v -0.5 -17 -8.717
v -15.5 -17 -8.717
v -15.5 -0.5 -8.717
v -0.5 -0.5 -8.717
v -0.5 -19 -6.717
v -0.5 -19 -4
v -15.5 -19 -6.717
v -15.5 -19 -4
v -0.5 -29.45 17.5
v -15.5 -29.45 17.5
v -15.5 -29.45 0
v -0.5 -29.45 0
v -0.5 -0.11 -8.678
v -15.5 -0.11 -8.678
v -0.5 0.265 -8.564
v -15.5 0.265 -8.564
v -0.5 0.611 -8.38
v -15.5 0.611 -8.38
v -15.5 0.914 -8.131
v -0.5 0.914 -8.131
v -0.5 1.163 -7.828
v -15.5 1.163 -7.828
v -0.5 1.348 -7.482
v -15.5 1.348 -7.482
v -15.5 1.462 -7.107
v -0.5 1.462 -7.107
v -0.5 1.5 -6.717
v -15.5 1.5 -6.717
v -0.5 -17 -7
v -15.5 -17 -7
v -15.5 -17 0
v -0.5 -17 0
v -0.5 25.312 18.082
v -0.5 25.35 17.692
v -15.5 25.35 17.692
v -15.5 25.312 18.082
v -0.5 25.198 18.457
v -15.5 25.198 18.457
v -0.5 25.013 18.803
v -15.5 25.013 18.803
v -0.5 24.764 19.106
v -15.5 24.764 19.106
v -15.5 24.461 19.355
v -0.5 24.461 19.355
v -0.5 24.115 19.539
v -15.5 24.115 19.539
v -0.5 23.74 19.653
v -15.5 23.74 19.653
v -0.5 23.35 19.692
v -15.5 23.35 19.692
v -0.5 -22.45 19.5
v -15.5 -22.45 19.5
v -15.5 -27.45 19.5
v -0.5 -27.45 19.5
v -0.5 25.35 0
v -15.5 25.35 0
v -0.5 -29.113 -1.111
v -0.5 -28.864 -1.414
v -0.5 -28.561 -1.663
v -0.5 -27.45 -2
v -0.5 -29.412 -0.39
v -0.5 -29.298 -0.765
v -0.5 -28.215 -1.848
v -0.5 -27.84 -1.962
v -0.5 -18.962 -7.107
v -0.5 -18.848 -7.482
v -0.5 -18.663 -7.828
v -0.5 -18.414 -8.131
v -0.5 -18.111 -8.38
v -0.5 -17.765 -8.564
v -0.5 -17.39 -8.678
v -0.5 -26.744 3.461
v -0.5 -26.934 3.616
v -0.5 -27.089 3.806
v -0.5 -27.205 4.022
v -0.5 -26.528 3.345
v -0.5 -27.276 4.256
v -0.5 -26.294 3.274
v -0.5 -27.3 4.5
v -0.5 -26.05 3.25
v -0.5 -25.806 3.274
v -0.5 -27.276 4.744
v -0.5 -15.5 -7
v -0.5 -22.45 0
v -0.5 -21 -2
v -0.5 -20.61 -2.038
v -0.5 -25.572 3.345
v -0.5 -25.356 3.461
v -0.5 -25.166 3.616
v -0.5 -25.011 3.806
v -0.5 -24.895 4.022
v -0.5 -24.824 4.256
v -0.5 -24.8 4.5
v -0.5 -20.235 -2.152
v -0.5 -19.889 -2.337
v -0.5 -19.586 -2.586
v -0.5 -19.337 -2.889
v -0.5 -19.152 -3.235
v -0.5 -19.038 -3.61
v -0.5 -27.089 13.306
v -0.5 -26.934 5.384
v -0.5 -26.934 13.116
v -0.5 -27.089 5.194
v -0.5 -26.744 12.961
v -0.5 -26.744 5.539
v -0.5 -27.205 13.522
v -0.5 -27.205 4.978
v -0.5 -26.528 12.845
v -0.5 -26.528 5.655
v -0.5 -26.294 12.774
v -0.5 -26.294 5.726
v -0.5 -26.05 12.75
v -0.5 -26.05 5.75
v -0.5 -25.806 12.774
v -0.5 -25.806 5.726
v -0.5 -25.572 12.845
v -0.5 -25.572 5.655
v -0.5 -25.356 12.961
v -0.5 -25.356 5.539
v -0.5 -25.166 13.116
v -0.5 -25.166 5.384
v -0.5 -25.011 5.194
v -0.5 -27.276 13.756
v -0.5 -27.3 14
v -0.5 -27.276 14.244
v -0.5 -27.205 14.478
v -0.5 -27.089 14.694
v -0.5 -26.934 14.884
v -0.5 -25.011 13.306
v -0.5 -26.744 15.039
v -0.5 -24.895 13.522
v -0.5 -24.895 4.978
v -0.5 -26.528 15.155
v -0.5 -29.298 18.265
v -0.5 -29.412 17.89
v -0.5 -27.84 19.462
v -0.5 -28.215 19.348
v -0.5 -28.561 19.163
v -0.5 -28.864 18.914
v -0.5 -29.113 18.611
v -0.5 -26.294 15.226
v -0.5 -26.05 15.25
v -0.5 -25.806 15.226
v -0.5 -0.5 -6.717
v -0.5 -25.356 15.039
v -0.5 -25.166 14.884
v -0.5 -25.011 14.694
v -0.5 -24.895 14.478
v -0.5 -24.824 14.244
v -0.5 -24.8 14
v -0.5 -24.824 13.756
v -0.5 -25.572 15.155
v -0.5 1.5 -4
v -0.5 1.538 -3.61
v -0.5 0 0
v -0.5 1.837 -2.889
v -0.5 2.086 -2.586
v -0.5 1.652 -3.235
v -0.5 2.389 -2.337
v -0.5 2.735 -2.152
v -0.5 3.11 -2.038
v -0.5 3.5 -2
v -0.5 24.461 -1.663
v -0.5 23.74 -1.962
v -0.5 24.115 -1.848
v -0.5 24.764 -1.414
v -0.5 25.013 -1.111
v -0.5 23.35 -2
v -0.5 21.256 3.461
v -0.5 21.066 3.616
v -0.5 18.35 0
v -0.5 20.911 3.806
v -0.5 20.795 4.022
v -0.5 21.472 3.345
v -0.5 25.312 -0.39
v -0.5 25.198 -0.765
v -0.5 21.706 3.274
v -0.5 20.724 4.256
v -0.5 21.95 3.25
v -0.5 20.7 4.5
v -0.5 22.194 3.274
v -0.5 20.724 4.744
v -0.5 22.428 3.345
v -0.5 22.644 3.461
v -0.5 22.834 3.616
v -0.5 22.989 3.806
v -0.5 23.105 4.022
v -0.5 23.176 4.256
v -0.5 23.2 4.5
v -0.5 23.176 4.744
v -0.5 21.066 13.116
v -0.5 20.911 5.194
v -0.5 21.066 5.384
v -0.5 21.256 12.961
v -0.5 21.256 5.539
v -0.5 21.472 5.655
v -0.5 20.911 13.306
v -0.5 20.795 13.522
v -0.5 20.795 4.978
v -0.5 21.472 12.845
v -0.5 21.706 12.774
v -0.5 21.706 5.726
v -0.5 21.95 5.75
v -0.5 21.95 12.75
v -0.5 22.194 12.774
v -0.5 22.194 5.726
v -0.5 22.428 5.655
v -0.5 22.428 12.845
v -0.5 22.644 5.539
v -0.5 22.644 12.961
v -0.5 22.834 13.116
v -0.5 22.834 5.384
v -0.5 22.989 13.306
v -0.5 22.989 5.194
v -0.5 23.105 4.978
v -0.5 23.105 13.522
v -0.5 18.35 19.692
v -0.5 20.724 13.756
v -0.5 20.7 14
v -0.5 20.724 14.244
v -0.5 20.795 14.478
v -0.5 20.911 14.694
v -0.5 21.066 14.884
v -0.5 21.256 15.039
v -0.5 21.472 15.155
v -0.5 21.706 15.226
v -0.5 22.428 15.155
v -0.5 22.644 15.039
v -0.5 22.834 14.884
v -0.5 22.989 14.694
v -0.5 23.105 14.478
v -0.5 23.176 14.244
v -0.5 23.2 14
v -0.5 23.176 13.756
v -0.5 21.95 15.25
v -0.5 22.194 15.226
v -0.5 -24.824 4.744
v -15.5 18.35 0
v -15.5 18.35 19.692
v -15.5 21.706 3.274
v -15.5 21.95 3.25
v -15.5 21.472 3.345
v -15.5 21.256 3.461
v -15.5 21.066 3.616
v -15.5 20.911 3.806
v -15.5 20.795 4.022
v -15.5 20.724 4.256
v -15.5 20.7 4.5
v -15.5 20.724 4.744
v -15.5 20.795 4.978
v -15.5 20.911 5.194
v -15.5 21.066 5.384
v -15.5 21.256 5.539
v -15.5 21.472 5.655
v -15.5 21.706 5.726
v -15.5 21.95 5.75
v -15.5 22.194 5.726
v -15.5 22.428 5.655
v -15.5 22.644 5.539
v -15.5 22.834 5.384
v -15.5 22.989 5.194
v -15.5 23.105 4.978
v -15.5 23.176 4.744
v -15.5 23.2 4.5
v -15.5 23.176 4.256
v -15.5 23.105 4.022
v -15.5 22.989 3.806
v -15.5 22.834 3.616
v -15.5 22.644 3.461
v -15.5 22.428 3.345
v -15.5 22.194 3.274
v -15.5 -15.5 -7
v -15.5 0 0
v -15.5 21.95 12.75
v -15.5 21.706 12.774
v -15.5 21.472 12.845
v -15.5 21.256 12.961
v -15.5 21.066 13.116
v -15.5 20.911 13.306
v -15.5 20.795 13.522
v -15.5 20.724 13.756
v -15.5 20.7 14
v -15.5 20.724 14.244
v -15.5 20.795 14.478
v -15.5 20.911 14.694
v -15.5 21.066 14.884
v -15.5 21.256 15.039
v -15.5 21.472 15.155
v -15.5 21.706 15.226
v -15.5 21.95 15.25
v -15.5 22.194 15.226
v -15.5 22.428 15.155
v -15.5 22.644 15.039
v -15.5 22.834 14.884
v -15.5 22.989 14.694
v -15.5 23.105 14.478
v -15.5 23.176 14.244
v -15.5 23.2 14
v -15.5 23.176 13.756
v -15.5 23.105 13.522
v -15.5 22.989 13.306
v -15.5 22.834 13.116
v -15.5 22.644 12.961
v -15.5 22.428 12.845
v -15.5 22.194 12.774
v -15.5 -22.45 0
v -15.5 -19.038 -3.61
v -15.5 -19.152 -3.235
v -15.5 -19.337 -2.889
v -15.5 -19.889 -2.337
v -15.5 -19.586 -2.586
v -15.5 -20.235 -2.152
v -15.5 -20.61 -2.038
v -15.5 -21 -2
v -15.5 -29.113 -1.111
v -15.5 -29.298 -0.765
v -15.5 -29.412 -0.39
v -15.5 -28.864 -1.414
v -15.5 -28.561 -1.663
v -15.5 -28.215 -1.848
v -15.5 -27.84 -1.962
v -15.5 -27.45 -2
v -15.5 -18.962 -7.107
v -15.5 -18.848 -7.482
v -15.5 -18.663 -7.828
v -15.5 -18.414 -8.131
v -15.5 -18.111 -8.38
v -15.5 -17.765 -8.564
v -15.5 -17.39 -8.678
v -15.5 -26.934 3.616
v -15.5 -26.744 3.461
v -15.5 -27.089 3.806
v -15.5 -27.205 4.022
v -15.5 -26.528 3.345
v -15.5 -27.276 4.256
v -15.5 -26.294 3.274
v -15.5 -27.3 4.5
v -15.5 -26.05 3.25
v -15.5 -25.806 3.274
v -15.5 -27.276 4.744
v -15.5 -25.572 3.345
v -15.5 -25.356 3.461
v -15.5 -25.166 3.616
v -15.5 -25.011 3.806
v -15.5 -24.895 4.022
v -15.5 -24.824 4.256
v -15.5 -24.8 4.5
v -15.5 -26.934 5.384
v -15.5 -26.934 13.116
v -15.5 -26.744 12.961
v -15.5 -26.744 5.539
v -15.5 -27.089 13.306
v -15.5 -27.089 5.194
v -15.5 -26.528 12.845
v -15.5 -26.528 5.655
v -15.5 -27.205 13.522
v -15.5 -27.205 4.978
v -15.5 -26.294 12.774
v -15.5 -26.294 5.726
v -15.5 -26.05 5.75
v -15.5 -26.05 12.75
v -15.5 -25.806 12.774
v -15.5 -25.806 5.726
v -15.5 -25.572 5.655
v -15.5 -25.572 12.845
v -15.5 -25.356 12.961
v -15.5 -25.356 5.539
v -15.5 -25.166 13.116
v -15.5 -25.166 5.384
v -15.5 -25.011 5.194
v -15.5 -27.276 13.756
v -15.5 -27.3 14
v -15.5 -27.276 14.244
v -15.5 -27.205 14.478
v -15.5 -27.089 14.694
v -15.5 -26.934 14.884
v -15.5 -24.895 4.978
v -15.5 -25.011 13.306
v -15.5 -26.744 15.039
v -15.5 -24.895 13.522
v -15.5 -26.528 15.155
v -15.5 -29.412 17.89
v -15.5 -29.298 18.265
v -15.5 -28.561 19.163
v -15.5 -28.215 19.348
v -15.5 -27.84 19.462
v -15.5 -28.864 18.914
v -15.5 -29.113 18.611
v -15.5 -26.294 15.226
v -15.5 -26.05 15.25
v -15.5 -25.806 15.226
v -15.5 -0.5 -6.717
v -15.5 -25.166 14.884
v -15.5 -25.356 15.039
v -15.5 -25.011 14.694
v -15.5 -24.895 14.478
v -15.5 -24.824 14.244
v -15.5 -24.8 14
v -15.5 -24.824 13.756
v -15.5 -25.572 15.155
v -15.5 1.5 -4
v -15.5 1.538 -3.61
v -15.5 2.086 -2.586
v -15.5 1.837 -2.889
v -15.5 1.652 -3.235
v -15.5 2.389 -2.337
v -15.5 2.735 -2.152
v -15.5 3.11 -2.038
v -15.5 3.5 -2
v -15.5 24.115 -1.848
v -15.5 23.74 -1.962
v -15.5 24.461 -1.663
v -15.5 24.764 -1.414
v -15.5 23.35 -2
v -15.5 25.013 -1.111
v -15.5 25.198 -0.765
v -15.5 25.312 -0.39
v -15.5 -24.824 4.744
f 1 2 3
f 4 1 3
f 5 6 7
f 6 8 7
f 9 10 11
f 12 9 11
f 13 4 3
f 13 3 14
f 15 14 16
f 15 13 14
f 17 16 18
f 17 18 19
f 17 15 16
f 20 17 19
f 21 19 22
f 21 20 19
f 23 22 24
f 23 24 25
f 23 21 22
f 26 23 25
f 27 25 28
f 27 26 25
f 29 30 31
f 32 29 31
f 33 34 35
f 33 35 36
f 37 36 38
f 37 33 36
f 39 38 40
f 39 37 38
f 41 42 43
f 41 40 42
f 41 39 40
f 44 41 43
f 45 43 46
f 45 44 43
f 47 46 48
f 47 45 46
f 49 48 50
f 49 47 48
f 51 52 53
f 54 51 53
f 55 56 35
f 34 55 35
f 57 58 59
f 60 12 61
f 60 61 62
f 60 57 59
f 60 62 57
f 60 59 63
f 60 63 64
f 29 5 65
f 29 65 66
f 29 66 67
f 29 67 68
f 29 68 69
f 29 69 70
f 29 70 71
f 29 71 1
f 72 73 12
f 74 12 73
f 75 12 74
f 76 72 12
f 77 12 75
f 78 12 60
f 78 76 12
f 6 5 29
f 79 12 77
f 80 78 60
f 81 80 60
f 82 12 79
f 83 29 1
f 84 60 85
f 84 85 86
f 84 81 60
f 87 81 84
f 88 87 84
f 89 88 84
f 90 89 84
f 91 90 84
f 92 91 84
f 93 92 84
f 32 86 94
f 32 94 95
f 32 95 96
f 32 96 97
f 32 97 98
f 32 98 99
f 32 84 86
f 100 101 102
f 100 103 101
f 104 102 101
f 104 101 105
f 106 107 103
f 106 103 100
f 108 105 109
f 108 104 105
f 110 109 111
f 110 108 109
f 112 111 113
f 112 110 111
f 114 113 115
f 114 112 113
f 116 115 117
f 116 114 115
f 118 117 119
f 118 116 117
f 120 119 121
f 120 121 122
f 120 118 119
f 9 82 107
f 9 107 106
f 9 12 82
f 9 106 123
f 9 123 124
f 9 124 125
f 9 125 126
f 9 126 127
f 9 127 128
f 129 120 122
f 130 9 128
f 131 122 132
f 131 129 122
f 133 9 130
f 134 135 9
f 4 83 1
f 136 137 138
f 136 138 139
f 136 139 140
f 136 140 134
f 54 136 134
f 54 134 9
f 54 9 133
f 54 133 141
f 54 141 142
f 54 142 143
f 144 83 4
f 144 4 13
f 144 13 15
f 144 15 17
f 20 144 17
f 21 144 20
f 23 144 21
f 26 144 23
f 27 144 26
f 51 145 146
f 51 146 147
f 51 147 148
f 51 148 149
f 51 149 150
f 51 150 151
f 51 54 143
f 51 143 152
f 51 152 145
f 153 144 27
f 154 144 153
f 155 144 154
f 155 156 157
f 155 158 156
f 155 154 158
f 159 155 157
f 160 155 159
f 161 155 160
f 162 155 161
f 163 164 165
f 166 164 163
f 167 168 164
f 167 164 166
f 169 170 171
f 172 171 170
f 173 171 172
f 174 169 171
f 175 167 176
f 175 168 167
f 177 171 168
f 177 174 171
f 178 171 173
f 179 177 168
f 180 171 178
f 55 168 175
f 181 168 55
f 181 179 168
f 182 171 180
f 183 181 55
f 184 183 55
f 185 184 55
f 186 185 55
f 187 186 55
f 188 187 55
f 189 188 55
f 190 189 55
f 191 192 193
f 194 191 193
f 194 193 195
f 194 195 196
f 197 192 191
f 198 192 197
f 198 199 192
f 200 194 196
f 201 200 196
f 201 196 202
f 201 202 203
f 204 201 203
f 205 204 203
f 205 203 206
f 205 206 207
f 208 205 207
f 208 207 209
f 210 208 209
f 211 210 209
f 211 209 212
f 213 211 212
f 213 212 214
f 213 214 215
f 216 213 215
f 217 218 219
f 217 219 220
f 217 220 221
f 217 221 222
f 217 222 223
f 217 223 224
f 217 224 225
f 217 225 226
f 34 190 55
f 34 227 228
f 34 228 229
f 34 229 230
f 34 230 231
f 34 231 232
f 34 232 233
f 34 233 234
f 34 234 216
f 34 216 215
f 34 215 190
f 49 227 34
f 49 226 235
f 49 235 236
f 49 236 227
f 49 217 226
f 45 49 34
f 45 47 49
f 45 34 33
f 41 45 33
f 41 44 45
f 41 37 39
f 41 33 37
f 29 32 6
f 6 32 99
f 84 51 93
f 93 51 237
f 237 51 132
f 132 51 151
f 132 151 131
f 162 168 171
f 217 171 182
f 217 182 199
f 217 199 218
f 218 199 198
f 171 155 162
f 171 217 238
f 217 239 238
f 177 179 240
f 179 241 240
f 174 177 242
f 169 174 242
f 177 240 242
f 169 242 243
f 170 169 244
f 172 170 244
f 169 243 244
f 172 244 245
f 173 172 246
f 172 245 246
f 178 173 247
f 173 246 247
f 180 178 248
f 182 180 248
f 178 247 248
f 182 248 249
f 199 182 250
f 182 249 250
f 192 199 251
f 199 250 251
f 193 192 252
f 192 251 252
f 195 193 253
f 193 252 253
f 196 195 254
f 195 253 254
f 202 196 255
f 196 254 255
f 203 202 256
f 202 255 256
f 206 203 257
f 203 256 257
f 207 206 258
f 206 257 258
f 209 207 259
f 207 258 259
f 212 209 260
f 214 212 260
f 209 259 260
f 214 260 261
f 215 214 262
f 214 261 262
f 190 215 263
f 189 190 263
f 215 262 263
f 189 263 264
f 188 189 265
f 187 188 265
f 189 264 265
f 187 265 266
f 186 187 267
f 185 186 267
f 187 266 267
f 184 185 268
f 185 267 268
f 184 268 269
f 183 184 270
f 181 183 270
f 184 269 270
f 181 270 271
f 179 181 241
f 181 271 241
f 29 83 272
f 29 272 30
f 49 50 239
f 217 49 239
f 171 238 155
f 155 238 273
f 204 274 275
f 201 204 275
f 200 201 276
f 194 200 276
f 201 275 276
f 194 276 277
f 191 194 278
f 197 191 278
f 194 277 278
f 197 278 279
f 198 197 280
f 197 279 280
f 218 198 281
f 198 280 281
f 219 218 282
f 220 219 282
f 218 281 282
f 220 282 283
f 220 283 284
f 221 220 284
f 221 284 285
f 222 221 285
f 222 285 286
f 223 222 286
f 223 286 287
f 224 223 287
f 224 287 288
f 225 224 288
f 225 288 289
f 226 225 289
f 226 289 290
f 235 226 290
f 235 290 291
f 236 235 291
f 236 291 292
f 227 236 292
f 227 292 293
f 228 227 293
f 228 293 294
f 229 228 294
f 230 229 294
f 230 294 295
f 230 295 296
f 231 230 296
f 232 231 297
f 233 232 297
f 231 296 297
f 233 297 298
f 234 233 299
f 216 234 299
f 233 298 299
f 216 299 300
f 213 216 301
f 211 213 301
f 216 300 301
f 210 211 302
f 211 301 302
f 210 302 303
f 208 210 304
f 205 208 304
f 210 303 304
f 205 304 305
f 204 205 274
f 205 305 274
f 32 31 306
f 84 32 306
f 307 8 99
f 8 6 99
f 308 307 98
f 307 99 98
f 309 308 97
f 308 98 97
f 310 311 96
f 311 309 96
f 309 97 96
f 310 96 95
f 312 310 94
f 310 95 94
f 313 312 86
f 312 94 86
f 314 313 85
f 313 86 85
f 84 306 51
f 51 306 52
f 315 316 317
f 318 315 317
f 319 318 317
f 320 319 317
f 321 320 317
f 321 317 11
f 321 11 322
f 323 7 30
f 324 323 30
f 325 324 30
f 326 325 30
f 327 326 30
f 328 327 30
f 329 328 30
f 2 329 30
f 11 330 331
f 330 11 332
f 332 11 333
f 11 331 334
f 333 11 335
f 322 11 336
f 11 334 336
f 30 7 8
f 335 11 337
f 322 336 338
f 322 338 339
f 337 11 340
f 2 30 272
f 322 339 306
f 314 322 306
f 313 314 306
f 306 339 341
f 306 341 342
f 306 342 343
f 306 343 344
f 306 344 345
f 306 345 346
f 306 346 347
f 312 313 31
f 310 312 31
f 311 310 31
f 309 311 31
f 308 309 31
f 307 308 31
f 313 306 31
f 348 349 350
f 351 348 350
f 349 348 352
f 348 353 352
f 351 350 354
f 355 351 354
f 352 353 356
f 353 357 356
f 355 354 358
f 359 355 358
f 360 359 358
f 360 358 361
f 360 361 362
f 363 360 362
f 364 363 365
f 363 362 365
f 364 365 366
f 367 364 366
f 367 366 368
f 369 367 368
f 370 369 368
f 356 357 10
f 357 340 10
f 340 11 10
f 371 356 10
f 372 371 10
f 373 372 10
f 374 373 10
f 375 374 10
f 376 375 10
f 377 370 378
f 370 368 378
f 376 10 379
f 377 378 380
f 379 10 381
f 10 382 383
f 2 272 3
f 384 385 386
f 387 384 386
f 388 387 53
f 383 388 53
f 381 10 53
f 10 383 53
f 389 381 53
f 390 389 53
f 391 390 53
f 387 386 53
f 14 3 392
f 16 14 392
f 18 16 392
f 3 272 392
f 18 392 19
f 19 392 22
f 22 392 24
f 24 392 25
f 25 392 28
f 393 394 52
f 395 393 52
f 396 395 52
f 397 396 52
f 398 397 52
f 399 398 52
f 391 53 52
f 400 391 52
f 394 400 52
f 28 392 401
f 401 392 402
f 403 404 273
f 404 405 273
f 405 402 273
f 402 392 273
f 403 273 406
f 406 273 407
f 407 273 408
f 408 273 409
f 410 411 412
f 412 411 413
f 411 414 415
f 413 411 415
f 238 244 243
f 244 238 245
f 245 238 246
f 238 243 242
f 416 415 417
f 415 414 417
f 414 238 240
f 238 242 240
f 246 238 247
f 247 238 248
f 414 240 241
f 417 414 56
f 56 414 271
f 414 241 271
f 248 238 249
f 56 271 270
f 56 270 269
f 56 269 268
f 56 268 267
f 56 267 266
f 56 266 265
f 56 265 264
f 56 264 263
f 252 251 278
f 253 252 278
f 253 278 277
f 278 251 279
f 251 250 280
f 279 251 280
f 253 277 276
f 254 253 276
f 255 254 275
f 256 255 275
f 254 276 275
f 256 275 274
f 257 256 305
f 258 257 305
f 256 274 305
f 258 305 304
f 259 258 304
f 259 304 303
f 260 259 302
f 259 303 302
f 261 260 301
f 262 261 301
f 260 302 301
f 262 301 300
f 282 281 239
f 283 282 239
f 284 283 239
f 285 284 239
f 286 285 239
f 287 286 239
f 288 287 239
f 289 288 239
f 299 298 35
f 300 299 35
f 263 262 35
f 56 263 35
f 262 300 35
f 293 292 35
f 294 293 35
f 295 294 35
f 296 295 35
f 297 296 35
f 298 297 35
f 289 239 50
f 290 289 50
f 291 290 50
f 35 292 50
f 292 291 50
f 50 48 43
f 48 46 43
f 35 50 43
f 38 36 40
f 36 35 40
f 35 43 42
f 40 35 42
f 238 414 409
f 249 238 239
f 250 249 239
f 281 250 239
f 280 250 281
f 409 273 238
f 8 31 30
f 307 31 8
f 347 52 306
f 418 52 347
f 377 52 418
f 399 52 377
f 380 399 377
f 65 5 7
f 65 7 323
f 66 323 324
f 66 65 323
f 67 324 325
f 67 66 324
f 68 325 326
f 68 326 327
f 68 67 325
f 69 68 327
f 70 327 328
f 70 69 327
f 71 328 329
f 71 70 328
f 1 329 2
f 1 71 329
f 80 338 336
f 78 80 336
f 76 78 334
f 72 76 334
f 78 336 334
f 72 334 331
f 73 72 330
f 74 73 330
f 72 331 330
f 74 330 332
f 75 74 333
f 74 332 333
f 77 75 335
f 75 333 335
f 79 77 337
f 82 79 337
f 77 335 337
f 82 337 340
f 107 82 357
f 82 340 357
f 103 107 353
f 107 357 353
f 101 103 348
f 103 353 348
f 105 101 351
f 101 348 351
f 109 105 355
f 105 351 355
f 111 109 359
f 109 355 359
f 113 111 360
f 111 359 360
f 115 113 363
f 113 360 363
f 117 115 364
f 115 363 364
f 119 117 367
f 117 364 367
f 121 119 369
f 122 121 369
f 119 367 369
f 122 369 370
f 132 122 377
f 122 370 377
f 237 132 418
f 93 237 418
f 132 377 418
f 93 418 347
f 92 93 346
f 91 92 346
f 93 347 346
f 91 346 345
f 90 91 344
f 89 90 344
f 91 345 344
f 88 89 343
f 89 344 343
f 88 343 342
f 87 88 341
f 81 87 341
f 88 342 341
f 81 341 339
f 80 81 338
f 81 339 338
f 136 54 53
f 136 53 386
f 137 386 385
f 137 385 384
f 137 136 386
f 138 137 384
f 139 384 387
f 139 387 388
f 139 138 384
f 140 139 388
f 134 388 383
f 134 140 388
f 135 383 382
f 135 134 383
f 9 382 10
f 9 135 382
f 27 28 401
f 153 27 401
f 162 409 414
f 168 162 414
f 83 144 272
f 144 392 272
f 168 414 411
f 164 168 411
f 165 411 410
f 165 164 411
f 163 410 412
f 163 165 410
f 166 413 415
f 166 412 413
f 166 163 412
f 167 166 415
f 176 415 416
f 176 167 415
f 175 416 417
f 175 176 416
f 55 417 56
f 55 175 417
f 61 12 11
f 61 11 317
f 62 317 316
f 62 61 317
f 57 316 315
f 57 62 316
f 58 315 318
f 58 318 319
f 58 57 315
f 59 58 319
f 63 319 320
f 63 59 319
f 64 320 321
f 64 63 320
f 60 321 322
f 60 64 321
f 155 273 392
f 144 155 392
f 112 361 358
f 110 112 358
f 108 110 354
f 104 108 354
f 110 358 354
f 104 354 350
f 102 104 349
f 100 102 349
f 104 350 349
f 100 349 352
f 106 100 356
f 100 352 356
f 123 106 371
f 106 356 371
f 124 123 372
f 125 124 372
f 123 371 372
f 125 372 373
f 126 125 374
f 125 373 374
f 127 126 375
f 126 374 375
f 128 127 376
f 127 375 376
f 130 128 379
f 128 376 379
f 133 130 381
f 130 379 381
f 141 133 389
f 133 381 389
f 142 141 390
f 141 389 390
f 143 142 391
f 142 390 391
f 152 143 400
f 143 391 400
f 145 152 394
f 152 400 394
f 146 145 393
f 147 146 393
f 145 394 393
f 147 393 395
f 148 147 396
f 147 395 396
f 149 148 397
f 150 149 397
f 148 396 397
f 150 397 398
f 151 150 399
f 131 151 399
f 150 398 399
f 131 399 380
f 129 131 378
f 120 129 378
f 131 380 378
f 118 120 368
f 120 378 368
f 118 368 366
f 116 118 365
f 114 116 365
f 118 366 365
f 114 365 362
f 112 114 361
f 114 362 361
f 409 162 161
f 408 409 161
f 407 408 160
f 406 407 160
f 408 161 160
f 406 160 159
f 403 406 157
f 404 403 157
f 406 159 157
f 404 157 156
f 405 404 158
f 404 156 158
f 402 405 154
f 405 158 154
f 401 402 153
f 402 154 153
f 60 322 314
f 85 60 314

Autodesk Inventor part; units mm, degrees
ref_plane "XZ Plane" through (0, 0, 0) normal (0, 1, 0) x (-1, 0, 0)
ref_plane "XY Plane" through (0, 0, 0) normal (0, 0, 1) x (1, 0, 0)
ref_plane "Work Plane1" through (-15.5, 0, 0) normal (1, 0, 0) x (0, 1, 0)
sketch "Sketch1" plane through (-15.5, 0, 0) normal (1, 0, 0) x (0, 1, 0)
  line L0 (-0.5, 0) -> (-0.5, -6.716667)
  line L1 (-0.5, -6.716667) -> (-15.5, -6.716667)
  line L2 (-17, -7) -> (-15.5, -7)
  line L3 (-17, 0) -> (-17, -7)
  line L4 (-17, 0) -> (-22.45, 0)
  line L5 (-22.45, 0) -> (-22.45, 19.5)
  line L6 (-22.45, 19.5) -> (-29.45, 19.5)
  line L7 (-29.45, 19.5) -> (-29.45, -2)
  line L8 (-29.45, -2) -> (-19, -2)
  line L9 (-19, -2) -> (-19, -8.716667)
  line L10 (-19, -8.716667) -> (1.5, -8.716667)
  line L11 (-17, -7) -> (-0.5, -7) construction
  line L12 (-9.247706, -7) -> (-9.247706, -16.201099) construction
  line L13 (1.5, -8.716667) -> (1.5, -2)
  line L14 (1.5, -2) -> (25.35, -2)
  line L15 (25.35, -2) -> (25.35, 19.691667)
  line L16 (25.35, 19.691667) -> (18.35, 19.691667)
  line L17 (18.35, 19.691667) -> (18.35, 0)
  line L18 (18.35, 0) -> (0, 0)
  line L19 (-14.45, -1.808333) -> (-14.45, -5.115) construction
  dimension "d1" = 19.5
  dimension "d2" = 2
  dimension "d3" = 2
  dimension "d4" = 2
  dimension "d5" = 7
  dimension "d6" = 7
  dimension "d7" = 2
  dimension "d8" = 8
  dimension "d9" = 40.8
sketch "Sketch1 outline for Extrusion1" plane through (-15.5, 0, 0) normal (1, 0, 0) x (0, 1, 0)
  line L0 (-17, 0) -> (-22.45, 0)
  line L1 (-17, -7) -> (-17, 0)
  line L2 (-15.5, -7) -> (-17, -7)
  line L3 (-0.5, -6.716667) -> (-15.5, -7)
  line L4 (0, 0) -> (-0.5, -6.716667)
  line L5 (18.35, 0) -> (0, 0)
  line L6 (18.35, 19.691667) -> (18.35, 0)
  line L7 (25.35, 19.691667) -> (18.35, 19.691667)
  line L8 (25.35, -2) -> (25.35, 19.691667)
  line L9 (1.5, -2) -> (25.35, -2)
  line L10 (1.5, -8.716667) -> (1.5, -2)
  line L11 (-19, -8.716667) -> (1.5, -8.716667)
  line L12 (-19, -2) -> (-19, -8.716667)
  line L13 (-29.45, -2) -> (-19, -2)
  line L14 (-29.45, 19.5) -> (-29.45, -2)
  line L15 (-22.45, 19.5) -> (-29.45, 19.5)
  line L16 (-22.45, 0) -> (-22.45, 19.5)
extrude "Extrusion1" add sketch "Sketch1 outline for Extrusion1" along normal blind 15
sketch "Sketch2" plane through (-0.5, 0, 0) normal (1, 0, 0) x (0, 0, -1)
  line L0 (0, -17) -> (0, -22.45)
  line L1 (0, 18.35) -> (0, 0)
  line L2 (-19.5, -29.45) -> (2, -29.45)
  line L3 (2, 25.35) -> (-19.691667, 25.35)
  point P0 (-4.5, -26.05)
  point P1 (-14, -26.05)
  point P2 (-4.5, 21.95)
  point P3 (-14, 21.95)
  dimension "d12" = 4.5
  dimension "d13" = 9.5
  dimension "d14" = 4.5
  dimension "d15" = 9.5
  dimension "d16" = 48
  dimension "d17" = 3.4
  dimension "d18" = 3.4
hole "Hole1" at (-0.5, -26.05, 4.5) at (-0.5, -26.05, 14) at (-0.5, 21.95, 4.5) at (-0.5, 21.95, 14) direction (-1, 0, 0) diameter 2.5 end through all
fillet "Fillet1" radius 2 8 edges at (-8, 25.35, 19.6917) (-8, 25.35, -2) (-8, 1.5, -2) (-8, 1.5, -8.7167) (-8, -19, -8.7167) (-8, -29.45, -2) (-8, -29.45, 19.5) (-8, -19, -2)
equation "\"d2\" = d3"
equation "\"d4\" = d3"
equation "\"d7\" = d3"
equation "\"d14\" = d12"
equation "\"d15\" = d13"
equation "\"d18\" = d17"
properties part number "bracket"
